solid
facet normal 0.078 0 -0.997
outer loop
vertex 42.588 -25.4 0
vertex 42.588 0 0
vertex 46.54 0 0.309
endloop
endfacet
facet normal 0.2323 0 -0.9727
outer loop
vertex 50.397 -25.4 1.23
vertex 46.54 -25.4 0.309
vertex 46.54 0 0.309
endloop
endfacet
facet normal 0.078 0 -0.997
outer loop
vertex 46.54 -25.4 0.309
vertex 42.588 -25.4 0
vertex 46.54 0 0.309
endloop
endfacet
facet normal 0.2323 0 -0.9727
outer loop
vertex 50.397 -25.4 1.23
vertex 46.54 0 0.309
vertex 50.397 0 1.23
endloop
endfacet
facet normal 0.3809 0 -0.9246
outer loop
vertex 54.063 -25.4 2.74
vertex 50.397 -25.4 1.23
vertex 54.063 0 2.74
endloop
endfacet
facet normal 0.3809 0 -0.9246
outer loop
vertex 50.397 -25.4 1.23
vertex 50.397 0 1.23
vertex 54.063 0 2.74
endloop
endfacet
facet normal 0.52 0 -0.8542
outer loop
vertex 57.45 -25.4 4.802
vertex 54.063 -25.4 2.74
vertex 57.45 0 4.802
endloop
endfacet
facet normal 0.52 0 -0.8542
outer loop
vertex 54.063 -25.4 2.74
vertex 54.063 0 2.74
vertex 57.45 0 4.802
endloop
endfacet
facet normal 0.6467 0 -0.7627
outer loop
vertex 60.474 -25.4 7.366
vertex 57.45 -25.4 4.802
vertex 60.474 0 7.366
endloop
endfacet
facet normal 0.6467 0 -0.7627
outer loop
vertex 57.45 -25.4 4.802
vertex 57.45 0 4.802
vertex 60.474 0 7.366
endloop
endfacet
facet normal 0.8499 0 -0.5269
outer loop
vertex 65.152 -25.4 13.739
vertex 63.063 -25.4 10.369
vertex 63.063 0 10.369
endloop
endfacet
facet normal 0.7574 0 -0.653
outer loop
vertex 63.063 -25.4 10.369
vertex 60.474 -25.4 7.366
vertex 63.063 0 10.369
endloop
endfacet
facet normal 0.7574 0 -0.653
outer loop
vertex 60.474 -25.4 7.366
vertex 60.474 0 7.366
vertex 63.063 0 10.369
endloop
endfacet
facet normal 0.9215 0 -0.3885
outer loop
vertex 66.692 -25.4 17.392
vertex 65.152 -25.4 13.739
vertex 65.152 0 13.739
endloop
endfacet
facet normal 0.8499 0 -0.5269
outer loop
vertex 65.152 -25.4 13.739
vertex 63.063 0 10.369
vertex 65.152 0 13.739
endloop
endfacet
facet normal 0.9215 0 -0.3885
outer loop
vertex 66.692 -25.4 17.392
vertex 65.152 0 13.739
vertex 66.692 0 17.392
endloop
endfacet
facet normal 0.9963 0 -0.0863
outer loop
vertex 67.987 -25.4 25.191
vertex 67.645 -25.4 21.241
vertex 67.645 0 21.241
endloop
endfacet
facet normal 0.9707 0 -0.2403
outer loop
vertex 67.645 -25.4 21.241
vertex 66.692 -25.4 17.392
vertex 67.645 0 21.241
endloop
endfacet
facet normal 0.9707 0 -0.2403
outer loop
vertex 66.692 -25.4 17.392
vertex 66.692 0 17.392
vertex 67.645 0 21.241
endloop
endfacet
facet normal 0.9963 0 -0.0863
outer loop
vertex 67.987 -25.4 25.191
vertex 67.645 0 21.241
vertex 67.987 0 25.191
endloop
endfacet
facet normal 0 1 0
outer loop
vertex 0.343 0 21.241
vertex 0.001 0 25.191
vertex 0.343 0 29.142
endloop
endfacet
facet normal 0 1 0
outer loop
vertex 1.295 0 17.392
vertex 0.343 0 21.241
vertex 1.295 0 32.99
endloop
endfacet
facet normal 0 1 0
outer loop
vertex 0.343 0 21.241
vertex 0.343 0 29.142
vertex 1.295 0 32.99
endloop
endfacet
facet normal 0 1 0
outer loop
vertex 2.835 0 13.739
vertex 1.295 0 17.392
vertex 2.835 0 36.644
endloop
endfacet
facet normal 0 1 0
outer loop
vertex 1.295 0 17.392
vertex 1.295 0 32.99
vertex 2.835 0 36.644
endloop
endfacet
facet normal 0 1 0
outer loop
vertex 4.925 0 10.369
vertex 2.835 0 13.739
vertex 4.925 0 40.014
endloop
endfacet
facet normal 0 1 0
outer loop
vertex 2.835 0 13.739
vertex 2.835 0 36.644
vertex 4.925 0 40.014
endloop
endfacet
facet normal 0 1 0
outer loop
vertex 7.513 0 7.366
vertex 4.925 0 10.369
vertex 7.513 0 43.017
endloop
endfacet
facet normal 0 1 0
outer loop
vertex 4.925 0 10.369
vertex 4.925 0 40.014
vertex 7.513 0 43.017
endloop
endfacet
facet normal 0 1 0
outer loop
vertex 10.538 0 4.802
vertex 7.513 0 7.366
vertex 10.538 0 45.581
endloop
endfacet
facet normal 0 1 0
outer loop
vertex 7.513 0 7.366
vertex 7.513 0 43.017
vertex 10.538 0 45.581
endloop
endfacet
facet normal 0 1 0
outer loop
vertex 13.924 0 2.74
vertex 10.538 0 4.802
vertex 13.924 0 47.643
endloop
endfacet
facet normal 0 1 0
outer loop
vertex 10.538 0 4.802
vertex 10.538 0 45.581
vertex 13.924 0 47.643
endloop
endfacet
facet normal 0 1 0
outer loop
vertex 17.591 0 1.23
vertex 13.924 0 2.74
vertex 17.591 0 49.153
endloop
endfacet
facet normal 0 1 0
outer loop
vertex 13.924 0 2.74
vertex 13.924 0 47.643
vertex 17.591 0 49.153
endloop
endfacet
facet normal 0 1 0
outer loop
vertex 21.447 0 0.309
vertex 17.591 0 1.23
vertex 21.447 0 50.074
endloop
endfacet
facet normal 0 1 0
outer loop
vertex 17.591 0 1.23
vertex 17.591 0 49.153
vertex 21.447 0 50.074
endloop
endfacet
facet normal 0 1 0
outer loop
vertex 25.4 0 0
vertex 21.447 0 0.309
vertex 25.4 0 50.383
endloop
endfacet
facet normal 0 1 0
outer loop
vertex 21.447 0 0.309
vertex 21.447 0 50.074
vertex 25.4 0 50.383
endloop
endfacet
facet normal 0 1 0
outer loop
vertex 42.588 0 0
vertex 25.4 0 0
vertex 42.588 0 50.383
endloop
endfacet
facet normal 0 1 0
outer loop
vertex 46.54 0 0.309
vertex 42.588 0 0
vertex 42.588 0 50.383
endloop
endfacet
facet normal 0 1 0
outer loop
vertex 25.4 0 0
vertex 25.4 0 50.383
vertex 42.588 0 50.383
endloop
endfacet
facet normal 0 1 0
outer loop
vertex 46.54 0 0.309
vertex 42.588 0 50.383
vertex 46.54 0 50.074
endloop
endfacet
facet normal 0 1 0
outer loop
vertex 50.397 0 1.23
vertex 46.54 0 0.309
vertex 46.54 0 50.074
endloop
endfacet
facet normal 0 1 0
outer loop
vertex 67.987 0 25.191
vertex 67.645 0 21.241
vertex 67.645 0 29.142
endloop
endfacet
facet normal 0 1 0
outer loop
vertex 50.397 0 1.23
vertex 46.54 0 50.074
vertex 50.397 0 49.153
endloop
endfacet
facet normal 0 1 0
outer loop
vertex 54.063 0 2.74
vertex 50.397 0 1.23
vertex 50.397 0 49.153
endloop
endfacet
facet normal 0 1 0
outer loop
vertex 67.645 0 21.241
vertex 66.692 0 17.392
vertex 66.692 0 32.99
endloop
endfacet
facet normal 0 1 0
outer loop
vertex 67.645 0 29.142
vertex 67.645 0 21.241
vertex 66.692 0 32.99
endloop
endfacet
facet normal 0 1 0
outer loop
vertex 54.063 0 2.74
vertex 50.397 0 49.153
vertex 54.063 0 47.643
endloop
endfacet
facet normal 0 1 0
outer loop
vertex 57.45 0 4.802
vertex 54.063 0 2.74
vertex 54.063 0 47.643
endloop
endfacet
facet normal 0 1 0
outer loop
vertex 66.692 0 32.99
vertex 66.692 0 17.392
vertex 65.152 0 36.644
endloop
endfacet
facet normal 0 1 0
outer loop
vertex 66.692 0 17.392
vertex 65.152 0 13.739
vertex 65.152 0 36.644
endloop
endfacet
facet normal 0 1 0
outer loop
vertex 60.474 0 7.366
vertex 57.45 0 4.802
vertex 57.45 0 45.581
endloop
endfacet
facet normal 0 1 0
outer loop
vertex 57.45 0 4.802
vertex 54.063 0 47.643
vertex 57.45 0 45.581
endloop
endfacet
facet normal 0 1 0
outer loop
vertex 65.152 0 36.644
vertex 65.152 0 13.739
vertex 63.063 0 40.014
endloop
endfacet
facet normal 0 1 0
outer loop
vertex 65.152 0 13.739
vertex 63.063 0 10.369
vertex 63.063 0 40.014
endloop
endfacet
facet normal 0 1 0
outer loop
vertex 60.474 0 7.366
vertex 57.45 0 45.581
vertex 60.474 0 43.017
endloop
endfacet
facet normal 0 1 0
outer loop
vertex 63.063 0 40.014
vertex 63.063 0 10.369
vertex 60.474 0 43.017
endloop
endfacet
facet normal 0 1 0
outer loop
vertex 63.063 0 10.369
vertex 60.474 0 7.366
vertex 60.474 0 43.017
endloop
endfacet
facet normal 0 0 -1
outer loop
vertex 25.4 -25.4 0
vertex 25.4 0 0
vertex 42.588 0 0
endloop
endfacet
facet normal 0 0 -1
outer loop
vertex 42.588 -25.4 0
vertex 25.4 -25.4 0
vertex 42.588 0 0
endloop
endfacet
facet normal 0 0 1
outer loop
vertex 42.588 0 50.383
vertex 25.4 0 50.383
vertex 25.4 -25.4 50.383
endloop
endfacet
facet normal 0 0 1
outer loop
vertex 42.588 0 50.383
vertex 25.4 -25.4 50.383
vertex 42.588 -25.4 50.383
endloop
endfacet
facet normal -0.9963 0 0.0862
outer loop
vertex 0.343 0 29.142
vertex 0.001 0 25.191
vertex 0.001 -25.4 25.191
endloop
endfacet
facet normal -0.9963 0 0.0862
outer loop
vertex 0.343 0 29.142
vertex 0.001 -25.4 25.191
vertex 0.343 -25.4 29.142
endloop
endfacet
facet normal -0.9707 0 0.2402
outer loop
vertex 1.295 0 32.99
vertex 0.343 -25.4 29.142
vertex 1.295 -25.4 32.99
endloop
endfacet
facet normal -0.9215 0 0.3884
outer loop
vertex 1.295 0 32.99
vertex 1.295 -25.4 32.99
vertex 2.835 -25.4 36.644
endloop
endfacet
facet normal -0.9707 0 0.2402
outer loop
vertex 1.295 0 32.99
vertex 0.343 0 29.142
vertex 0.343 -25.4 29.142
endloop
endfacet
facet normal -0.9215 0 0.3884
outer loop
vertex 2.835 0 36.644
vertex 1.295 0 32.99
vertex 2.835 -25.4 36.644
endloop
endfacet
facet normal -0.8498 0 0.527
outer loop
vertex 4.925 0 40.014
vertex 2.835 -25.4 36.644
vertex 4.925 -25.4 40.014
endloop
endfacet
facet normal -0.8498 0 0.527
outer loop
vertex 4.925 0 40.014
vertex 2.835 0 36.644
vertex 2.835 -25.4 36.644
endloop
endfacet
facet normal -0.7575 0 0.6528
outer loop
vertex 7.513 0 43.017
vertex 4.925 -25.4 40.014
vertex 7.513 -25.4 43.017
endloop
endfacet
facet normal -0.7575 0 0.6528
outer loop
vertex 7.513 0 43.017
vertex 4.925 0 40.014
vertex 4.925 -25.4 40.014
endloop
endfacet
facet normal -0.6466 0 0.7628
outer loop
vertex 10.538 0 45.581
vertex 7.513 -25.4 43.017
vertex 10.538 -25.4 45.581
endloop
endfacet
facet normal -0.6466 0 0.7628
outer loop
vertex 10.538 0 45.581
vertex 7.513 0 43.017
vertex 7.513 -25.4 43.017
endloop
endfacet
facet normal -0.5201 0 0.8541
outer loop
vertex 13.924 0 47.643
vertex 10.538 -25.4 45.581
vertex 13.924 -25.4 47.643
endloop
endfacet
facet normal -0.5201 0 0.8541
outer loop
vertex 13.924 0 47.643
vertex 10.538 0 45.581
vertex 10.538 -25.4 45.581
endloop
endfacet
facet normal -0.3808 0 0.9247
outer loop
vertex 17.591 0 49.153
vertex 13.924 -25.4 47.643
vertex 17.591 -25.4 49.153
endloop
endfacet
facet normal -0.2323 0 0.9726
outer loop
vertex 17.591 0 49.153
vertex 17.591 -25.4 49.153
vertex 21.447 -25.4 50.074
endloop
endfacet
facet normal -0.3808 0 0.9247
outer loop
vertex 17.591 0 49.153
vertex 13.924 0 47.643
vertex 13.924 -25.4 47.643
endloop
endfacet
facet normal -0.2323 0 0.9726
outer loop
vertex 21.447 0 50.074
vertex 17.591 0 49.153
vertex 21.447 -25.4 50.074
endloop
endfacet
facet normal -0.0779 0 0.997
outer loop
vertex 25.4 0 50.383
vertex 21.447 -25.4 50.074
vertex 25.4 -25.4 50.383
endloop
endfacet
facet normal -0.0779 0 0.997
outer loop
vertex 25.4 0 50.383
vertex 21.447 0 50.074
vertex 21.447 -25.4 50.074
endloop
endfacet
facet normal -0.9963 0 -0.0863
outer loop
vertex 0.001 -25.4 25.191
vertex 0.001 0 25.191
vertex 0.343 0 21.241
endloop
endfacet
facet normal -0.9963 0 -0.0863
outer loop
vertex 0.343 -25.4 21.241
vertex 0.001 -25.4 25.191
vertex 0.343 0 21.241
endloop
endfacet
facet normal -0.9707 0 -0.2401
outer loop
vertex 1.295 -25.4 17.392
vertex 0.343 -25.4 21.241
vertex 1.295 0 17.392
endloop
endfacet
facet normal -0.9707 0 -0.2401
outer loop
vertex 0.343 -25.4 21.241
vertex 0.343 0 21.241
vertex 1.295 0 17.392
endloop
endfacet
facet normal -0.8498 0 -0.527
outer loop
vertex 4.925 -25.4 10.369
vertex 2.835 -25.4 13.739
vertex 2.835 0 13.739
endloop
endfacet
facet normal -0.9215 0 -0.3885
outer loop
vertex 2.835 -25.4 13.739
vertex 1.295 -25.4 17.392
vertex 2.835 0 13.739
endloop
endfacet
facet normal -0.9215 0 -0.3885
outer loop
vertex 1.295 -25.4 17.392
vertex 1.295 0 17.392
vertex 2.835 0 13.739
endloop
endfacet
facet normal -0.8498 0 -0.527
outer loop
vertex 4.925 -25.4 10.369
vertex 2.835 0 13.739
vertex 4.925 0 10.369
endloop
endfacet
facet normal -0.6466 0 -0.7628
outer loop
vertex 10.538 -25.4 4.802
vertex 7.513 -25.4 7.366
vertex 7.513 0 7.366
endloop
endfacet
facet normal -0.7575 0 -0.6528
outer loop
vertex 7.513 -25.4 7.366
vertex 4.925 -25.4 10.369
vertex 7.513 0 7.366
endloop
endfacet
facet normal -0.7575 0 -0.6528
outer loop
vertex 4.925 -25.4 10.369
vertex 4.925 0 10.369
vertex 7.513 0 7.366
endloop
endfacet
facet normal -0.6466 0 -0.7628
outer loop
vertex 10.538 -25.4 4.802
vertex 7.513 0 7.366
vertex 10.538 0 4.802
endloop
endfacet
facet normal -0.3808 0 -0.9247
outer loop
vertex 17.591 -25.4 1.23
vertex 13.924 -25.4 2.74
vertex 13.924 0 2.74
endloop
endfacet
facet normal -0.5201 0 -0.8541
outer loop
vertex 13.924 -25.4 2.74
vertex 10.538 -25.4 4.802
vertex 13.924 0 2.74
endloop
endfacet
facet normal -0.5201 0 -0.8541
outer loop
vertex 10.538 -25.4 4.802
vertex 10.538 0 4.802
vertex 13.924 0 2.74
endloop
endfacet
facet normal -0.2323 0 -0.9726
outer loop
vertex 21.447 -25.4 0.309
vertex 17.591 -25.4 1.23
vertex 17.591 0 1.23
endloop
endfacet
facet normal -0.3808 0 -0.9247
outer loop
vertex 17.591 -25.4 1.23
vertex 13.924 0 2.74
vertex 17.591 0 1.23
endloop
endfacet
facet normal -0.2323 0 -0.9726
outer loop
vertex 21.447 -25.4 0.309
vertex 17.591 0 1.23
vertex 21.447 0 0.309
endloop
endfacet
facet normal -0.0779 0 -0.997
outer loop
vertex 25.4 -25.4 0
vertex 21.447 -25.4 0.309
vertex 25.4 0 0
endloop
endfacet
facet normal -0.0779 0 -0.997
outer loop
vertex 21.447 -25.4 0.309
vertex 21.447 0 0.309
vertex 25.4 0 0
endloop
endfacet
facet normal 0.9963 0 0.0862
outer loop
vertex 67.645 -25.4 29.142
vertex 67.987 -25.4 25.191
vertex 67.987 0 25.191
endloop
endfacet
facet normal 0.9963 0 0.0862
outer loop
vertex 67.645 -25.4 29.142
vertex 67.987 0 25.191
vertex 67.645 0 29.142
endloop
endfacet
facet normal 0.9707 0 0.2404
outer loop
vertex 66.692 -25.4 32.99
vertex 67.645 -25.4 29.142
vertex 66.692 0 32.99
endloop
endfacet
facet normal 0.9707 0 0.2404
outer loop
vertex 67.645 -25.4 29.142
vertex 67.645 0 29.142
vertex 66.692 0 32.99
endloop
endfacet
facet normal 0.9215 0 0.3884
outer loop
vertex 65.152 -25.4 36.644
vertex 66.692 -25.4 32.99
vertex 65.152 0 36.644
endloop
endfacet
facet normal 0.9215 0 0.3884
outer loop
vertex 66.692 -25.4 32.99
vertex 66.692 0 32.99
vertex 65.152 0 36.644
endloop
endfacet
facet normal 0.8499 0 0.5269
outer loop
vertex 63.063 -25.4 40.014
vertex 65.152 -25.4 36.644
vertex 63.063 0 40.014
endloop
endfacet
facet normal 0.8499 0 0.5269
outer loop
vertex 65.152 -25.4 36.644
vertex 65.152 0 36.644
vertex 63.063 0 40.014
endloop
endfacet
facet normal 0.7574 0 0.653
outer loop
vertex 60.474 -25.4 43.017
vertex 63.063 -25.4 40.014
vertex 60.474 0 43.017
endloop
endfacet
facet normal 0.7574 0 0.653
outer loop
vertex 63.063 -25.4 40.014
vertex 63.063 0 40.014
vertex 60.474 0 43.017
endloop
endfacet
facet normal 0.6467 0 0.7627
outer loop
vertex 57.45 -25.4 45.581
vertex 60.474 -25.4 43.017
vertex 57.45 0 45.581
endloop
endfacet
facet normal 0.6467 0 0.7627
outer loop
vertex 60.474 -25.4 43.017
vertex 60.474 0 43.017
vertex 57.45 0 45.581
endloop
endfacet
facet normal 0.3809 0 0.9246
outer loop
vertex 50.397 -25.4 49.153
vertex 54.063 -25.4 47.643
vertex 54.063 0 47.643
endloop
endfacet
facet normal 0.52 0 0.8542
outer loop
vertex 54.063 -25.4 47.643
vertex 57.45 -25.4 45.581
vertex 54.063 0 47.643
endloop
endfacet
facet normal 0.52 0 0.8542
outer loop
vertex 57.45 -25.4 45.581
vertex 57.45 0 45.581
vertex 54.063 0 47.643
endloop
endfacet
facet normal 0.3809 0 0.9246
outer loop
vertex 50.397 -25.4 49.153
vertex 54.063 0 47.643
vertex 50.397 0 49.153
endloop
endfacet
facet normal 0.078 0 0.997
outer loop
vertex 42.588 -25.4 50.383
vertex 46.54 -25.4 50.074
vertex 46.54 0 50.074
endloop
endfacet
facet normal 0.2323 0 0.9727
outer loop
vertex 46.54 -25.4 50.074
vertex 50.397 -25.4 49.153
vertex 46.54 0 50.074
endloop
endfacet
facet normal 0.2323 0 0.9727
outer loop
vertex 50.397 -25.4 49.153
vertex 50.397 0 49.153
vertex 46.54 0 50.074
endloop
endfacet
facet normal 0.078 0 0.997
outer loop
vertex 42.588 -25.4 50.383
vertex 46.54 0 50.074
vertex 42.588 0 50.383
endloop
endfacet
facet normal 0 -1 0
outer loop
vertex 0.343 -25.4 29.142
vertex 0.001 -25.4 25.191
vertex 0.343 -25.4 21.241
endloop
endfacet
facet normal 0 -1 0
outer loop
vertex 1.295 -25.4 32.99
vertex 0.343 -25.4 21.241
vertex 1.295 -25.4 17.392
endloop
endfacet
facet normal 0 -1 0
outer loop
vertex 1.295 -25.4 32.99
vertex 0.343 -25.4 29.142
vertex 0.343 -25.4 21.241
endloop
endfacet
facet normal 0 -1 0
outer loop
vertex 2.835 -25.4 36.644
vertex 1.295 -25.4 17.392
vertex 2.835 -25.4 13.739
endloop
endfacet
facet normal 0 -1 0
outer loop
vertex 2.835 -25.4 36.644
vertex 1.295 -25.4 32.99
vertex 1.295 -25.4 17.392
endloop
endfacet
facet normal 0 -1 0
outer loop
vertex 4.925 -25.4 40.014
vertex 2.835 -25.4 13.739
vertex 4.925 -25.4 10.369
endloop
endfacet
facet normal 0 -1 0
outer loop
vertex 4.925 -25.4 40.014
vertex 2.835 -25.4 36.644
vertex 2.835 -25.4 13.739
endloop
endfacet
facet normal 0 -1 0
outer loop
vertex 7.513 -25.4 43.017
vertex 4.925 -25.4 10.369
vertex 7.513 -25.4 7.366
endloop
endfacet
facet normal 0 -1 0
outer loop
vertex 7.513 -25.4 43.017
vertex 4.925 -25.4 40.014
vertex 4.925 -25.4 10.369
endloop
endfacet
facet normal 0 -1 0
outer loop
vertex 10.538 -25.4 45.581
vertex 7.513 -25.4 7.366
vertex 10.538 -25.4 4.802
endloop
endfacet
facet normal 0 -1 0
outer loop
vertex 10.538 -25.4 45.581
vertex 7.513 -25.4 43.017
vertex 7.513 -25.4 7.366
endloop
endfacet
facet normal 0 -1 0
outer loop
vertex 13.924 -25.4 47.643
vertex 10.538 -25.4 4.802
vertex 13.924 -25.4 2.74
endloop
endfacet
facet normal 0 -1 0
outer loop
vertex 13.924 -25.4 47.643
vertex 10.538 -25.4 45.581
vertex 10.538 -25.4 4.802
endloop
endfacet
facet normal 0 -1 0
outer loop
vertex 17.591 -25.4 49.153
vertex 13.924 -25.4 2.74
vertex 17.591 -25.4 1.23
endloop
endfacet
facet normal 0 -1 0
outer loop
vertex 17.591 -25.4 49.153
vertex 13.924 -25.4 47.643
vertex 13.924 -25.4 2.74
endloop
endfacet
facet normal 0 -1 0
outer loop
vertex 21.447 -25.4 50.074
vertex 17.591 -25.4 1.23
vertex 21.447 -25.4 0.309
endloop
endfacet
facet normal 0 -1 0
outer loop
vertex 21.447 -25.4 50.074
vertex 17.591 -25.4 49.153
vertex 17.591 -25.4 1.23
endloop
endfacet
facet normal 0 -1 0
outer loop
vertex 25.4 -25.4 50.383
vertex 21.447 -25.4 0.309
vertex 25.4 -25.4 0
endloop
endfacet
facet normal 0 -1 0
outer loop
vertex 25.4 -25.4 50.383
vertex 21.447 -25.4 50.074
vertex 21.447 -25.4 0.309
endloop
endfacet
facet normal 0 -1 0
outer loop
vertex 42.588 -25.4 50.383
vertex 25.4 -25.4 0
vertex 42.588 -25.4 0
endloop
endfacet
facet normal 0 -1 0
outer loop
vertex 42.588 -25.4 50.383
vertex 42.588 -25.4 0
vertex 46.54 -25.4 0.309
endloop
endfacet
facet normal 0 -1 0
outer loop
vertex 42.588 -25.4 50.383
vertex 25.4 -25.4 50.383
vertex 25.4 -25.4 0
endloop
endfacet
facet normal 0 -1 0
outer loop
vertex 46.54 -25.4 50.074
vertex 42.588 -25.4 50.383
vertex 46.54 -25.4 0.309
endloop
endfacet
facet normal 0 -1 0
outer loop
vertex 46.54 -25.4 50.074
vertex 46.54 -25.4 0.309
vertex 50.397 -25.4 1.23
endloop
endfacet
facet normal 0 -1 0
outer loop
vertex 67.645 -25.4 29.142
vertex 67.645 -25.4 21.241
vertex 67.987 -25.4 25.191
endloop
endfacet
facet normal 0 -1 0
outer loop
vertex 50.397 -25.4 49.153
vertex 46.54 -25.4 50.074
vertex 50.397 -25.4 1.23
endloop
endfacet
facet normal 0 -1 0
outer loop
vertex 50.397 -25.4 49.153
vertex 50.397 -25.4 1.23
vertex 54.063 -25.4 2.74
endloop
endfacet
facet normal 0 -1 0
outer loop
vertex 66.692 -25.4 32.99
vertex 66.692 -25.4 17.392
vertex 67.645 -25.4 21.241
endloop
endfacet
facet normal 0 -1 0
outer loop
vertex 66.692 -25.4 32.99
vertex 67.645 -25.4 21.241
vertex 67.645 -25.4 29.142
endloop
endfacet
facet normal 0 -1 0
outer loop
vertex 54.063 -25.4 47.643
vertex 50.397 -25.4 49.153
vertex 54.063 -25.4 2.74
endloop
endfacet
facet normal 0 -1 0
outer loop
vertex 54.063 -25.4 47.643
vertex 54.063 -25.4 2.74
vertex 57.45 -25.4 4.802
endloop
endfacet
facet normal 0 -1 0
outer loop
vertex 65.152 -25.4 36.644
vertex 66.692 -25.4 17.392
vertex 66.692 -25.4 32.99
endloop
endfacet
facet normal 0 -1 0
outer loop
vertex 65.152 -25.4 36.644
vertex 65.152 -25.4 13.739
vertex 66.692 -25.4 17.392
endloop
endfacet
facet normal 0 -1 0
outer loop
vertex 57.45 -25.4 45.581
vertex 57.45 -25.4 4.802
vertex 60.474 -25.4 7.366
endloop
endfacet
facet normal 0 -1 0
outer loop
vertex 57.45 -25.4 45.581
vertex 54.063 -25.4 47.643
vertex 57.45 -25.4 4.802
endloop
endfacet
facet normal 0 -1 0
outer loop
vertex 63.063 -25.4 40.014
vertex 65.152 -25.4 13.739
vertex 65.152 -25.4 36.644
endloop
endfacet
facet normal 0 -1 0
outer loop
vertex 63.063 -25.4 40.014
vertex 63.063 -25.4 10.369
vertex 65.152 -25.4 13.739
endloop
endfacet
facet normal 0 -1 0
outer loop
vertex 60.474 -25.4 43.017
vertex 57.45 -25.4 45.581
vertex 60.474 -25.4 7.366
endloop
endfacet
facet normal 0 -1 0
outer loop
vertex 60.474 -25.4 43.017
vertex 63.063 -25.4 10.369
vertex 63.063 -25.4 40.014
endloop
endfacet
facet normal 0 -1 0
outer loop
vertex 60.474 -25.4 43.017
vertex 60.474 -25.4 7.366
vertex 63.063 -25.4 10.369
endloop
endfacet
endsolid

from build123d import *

# Parameters (mm, degrees)
F0_W        = 67.9875686765
F0_H        = 50.382964313
F1_DEPTH    = 25.4
F2_T1_DEPTH = 152.4


# Not quite as in the source:
# - a fillet or chamfer that OpenCascade refuses, or shapes differently, is made with other operations: its cross-section is extruded or revolved along the edge and cut away or added


with BuildPart() as f1:
    # F0 (on Front) → F1 (new body)
    with BuildSketch(Plane.XZ):
        with Locations((33.9937843382, 25.1914821565)):
            Rectangle(F0_W, F0_H)
    extrude(amount=F1_DEPTH)

    # F2: fillet of radius 25.4 on 4 edges, made by hand

    # F2_s2 → F2_t1 (cut)
    with BuildSketch(Plane.XZ.offset(-63.5)):
        with BuildLine():
            ThreePointArc((0, 24.982964313), (7.4394877579, 42.9434765552), (25.4, 50.382964313))
            Line((25.4, 50.382964313), (0, 50.382964313))
            Line((0, 50.382964313), (0, 24.982964313))
        make_face()
        with BuildLine():
            ThreePointArc((67.9875686765, 24.982964313), (60.5480809186, 42.9434765552), (42.5875686765, 50.382964313))
            Line((42.5875686765, 50.382964313), (67.9875686765, 50.382964313))
            Line((67.9875686765, 50.382964313), (67.9875686765, 24.982964313))
        make_face()
        with BuildLine():
            ThreePointArc((0, 25.4), (7.4394877579, 7.4394877579), (25.4, 0))
            Line((25.4, 0), (0, 0))
            Line((0, 0), (0, 25.4))
        make_face()
        with BuildLine():
            ThreePointArc((42.5875686765, 0), (60.5480809186, 7.4394877579), (67.9875686765, 25.4))
            Line((67.9875686765, 25.4), (67.9875686765, 0))
            Line((67.9875686765, 0), (42.5875686765, 0))
        make_face()
    extrude(amount=F2_T1_DEPTH, mode=Mode.SUBTRACT)


solid = f1.part
